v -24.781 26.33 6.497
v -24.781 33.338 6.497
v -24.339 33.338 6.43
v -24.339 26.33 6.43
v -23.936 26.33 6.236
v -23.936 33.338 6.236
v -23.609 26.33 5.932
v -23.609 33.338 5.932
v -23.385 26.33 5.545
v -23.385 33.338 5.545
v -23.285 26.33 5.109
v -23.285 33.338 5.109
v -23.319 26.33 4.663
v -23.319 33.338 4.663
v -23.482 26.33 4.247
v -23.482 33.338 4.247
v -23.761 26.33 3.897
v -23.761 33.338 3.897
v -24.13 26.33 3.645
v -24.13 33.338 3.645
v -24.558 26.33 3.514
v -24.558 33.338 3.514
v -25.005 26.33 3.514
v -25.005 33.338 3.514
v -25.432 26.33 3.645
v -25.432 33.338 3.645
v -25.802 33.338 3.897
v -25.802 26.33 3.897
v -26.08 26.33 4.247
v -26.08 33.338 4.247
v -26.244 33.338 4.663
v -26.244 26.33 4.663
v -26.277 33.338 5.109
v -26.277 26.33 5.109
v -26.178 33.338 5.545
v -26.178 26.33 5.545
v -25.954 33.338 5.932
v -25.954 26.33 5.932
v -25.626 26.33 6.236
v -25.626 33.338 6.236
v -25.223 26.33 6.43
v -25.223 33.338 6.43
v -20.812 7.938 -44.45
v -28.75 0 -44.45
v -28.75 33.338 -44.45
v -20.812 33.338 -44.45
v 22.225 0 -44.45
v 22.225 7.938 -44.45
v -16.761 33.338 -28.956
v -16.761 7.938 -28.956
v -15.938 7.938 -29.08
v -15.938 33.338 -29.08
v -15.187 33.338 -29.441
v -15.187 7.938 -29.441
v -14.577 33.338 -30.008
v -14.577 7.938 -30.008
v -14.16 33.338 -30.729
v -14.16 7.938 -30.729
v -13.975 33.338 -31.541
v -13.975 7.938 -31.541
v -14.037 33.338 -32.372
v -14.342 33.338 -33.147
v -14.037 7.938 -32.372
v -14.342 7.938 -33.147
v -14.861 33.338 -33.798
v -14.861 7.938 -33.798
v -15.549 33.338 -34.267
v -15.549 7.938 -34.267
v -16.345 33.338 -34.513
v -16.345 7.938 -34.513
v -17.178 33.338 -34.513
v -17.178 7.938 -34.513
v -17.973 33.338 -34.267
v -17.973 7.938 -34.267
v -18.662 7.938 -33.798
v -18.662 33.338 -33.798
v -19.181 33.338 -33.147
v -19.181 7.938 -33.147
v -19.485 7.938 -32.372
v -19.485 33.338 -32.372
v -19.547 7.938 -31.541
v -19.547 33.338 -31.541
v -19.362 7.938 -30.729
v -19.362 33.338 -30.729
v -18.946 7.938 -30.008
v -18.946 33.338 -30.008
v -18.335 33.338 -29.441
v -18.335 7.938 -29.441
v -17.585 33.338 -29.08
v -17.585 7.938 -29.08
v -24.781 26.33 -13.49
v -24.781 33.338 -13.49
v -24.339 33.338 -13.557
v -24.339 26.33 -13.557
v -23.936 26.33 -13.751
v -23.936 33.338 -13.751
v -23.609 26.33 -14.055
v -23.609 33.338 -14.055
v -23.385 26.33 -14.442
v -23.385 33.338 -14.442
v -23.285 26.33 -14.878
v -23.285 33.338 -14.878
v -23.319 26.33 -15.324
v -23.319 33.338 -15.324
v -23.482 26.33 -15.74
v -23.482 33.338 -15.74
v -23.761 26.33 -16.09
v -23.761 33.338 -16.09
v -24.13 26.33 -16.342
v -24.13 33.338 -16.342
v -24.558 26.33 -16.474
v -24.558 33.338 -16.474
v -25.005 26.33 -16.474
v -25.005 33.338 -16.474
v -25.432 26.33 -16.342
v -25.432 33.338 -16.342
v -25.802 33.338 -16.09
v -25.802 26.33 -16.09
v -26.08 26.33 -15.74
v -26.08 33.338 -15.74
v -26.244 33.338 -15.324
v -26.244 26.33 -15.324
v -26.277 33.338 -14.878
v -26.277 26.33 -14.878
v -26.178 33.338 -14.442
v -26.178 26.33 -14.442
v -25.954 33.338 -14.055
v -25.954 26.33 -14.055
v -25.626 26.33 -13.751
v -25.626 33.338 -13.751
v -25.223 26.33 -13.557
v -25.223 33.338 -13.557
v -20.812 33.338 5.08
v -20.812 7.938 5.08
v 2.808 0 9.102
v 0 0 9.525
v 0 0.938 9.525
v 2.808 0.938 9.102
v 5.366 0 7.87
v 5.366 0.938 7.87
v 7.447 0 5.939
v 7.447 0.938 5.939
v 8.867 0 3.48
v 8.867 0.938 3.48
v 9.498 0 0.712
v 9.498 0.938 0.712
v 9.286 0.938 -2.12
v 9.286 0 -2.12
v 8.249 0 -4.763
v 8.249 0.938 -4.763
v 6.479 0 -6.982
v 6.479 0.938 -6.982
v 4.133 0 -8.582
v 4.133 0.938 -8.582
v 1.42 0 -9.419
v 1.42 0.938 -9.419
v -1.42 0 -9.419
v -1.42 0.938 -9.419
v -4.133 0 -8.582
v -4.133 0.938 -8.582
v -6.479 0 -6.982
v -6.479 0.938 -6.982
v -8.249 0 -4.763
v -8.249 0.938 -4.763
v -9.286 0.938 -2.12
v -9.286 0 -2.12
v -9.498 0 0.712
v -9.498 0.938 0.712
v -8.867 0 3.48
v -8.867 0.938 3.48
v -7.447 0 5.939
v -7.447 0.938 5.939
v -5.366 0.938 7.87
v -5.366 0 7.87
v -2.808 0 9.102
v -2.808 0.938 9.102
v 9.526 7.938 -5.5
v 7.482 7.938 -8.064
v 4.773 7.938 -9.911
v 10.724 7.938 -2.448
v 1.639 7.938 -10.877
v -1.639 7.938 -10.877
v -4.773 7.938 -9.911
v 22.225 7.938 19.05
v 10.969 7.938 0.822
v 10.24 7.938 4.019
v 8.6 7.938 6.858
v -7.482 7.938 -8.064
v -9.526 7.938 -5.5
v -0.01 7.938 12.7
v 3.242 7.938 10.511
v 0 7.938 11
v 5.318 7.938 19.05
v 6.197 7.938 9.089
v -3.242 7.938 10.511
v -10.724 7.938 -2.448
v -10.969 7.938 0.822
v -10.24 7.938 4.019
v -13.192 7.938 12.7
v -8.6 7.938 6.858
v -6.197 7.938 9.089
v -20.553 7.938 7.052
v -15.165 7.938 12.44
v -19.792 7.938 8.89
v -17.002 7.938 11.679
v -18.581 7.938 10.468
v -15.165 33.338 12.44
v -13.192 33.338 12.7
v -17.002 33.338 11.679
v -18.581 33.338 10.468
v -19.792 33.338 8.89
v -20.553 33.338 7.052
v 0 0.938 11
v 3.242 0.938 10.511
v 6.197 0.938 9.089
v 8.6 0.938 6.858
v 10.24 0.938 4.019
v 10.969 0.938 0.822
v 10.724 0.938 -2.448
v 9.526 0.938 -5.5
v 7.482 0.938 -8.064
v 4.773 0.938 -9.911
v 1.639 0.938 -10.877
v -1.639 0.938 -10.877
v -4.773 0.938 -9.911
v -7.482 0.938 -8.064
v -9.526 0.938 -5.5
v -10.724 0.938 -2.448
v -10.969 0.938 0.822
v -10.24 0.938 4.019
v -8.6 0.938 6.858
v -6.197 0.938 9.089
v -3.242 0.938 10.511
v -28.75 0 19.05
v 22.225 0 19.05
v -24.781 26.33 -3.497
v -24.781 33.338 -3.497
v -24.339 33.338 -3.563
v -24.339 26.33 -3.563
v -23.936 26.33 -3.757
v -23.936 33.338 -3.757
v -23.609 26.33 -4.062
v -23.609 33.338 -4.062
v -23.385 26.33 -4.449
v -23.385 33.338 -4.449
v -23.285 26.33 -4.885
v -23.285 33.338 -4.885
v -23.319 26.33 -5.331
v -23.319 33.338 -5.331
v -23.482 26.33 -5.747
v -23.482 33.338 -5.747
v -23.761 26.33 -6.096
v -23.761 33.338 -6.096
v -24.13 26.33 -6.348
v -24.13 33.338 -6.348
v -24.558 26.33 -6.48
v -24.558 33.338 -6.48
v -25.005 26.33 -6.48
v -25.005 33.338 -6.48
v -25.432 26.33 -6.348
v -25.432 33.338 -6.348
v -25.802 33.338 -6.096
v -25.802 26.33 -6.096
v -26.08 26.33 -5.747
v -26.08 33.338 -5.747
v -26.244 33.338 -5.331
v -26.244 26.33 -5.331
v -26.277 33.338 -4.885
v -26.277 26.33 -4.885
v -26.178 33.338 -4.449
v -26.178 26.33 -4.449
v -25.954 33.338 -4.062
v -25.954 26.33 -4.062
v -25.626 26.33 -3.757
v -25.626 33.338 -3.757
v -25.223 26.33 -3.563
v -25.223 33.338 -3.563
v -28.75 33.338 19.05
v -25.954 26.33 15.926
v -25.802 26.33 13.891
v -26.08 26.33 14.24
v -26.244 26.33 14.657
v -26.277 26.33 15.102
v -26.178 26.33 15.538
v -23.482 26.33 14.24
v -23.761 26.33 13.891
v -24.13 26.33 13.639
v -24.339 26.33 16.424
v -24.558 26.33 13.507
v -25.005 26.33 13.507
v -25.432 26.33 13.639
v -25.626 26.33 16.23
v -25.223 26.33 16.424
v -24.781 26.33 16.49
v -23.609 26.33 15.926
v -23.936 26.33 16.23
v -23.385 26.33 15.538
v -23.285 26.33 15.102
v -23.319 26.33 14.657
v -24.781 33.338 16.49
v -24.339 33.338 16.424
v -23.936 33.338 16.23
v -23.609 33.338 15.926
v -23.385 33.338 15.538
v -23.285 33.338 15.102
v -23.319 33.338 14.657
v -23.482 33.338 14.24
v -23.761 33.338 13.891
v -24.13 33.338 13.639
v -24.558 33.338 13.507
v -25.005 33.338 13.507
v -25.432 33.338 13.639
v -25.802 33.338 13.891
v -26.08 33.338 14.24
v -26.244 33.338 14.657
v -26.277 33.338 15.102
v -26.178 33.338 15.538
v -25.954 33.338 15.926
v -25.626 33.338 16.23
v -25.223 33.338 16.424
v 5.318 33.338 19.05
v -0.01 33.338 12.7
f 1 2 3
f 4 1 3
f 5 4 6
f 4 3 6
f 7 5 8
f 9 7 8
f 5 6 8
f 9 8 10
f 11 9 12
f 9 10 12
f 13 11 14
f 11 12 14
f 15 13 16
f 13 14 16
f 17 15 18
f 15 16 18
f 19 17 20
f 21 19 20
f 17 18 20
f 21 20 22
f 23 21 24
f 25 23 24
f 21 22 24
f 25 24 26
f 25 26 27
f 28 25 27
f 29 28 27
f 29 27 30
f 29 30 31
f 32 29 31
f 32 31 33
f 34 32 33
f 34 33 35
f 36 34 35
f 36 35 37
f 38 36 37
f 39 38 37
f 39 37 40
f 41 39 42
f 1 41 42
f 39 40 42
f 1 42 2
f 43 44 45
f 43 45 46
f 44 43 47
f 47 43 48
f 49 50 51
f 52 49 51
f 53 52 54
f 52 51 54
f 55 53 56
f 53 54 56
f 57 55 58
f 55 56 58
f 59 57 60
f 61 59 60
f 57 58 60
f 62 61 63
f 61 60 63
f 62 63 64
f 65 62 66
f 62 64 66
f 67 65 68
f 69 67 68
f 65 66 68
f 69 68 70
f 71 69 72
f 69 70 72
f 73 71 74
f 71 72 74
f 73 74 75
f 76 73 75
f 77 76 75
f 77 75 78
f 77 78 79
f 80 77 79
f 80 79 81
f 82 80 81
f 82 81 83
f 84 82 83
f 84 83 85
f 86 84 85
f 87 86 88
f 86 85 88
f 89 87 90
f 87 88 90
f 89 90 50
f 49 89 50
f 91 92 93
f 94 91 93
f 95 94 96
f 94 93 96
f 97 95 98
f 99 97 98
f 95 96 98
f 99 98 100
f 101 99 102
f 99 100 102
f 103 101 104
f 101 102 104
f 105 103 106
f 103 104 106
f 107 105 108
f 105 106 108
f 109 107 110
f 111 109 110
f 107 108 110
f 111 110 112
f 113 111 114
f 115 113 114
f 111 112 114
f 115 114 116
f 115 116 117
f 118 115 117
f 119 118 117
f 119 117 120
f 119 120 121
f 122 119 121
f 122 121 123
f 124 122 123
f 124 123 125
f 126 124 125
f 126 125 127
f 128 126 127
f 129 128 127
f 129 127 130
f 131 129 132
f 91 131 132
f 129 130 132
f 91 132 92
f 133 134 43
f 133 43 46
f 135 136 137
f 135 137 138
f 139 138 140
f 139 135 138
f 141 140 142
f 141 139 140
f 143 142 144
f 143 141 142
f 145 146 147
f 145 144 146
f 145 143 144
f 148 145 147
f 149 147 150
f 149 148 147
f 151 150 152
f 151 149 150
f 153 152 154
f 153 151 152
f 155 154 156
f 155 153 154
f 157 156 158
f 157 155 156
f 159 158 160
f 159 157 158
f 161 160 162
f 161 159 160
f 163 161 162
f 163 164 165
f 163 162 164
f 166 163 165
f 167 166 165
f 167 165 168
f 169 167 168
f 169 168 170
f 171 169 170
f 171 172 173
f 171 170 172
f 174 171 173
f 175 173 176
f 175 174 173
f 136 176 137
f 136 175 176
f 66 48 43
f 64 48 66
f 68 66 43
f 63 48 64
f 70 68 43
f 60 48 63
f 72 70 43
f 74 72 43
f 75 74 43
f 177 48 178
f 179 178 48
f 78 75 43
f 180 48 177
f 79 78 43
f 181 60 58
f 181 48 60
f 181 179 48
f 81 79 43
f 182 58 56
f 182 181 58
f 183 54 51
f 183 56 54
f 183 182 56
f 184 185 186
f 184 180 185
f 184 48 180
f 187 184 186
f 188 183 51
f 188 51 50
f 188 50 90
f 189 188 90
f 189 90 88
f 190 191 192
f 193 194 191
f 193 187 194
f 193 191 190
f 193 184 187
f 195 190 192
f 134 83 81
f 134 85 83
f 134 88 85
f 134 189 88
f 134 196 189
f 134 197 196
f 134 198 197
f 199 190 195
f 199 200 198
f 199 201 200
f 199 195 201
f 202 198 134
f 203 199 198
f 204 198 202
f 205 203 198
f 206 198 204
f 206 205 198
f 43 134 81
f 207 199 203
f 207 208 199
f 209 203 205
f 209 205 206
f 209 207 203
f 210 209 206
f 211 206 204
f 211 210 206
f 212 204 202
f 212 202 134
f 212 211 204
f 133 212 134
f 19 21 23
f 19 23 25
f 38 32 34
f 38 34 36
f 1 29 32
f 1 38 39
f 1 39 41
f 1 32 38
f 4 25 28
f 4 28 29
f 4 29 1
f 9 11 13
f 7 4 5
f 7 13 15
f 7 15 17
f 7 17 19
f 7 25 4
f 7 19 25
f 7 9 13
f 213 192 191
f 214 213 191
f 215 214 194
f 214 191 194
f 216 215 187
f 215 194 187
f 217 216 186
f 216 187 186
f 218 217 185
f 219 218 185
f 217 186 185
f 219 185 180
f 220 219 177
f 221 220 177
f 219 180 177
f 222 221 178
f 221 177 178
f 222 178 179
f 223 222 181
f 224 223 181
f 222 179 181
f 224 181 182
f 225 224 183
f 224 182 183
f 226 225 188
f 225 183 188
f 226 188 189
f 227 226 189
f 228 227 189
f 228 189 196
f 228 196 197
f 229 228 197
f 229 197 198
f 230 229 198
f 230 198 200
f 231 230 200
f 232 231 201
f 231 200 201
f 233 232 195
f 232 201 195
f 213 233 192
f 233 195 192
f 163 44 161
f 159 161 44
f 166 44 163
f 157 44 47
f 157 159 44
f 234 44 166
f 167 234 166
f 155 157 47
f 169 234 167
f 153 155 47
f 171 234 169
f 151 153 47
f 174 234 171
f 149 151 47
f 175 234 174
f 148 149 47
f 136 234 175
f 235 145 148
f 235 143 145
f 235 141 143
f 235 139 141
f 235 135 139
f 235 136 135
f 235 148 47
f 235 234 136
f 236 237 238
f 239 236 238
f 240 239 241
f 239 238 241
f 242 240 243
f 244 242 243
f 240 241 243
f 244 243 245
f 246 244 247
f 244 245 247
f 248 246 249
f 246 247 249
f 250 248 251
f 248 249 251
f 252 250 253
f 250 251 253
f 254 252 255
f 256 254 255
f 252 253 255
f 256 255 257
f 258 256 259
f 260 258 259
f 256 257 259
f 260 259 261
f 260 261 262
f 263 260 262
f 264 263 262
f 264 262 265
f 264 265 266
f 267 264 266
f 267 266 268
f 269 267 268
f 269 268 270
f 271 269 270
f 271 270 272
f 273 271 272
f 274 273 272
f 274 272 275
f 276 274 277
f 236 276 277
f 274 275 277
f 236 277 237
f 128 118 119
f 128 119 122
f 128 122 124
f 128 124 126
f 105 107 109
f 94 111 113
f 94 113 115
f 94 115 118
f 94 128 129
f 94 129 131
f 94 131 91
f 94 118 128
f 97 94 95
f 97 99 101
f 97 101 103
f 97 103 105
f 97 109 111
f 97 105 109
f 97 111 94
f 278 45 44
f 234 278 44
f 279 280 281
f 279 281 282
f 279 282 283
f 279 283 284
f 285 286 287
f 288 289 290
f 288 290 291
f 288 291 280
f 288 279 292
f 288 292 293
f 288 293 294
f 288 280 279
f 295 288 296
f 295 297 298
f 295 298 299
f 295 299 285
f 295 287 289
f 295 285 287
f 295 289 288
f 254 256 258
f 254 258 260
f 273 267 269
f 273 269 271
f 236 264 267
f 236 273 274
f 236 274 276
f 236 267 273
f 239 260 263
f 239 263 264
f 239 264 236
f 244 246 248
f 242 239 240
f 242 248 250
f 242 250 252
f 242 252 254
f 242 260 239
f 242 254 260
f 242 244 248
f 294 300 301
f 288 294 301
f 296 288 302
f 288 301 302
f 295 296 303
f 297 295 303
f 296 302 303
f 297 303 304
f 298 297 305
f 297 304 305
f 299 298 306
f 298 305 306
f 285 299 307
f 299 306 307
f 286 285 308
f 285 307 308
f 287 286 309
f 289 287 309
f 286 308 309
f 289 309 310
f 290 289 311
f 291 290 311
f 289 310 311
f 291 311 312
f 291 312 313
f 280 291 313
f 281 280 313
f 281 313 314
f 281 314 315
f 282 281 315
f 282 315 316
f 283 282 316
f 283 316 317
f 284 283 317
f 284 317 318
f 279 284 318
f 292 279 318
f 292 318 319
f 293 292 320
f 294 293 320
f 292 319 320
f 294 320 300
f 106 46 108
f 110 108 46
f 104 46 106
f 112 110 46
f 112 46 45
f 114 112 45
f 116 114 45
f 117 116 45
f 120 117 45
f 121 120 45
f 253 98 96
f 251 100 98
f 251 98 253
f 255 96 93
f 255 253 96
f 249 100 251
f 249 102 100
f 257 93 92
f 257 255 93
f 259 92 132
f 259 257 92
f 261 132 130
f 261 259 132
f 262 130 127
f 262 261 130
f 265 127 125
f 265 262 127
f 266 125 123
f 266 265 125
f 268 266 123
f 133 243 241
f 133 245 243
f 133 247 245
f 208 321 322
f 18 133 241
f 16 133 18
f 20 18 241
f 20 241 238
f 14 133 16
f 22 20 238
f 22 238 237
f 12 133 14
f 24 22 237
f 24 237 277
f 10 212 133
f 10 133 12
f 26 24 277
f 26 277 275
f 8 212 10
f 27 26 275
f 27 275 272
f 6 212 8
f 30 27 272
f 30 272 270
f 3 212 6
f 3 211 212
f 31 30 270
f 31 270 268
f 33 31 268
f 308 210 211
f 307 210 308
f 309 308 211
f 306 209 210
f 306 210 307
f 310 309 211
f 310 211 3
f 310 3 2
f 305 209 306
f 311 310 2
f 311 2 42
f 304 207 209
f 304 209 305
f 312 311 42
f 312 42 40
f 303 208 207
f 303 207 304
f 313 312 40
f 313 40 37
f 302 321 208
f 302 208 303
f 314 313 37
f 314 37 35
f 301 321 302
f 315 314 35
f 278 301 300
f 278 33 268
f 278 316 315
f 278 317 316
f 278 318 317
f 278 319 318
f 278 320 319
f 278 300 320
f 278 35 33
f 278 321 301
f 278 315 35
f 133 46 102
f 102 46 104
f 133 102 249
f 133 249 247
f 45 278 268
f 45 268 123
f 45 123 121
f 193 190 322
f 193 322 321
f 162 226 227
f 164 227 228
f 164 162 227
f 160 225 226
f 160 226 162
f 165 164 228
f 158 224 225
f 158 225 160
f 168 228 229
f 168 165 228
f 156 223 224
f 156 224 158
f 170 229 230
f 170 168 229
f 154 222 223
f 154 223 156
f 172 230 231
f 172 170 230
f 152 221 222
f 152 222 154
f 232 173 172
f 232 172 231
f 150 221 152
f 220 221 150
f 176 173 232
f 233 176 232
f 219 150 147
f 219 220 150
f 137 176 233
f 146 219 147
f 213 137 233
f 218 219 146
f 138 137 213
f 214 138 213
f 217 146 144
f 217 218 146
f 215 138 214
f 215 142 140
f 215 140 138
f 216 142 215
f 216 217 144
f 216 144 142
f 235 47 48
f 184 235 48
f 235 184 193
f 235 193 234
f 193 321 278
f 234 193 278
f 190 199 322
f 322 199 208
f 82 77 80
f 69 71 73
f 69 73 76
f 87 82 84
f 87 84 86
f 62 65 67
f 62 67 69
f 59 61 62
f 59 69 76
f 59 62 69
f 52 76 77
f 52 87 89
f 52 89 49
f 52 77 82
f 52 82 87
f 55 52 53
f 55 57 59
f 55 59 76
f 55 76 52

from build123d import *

# Parameters (mm, degrees)
SKETCH1_W            = 50.975
SKETCH1_H            = 38.1
BASE_DEPTH           = 7.9375
SKETCH2_R            = 11
BEARING_BORE_DEPTH   = 7
THRU_HOLE_DEPTH      = 36.191831439
THRU_HOLE_DEPTH_BACK = 36.191831439
SKETCH3_R            = 9.525
SKETCH4_W            = 7.9375
SKETCH4_H            = 38.1
VERTICAL_DEPTH       = 25.4
SKETCH7_W            = 6.35
SKETCH7_H            = 25.4
ARM_STOP_DEPTH       = 20.8026
ANGLED_FACE_REACH    = 49.967
FILLET1_R            = 7.62
SKETCH6_R            = 1.5
DOWEL_HOLES_DEPTH    = 7.007999954
SPRING_BASE_DEPTH    = 25.4
SKETCH12_R           = 2.794
SPRING_MOUNT_DEPTH   = 25.4


with BuildPart() as part:
    # Sketch1 → Base (new body)
    with BuildSketch(Plane(origin=(0, 0, 0), x_dir=(1, 0, 0), z_dir=(0, 1, 0))):
        with Locations((-3.2625, 0)):
            Rectangle(SKETCH1_W, SKETCH1_H)
    extrude(amount=BASE_DEPTH)

    # Sketch2 → Bearing Bore (cut)
    with BuildSketch(Plane(origin=(0, 7.9375, 0), x_dir=(1, 0, 0), z_dir=(0, 1, 0))):
        with Locations(Location((0, 0, 0), (0, 0, 270))):
            Circle(SKETCH2_R)
    extrude(amount=-BEARING_BORE_DEPTH, mode=Mode.SUBTRACT)

    # Sketch3 → Thru Hole (cut, two sides: drawn at the far end of the back side and taken through both)
    with BuildSketch(Plane(origin=(0, 0.9375, 0), x_dir=(1, 0, 0), z_dir=(0, 1, 0)).offset(-THRU_HOLE_DEPTH_BACK)):
        with Locations(Location((0, 0, 0), (0, 0, 270))):
            Circle(SKETCH3_R)
    extrude(amount=THRU_HOLE_DEPTH + THRU_HOLE_DEPTH_BACK, mode=Mode.SUBTRACT)

    # Sketch4 → Vertical (add)
    with BuildSketch(Plane(origin=(0, 7.9375, 0), x_dir=(1, 0, 0), z_dir=(0, 1, 0))):
        with Locations((-24.78125, 0)):
            Rectangle(SKETCH4_W, SKETCH4_H)
    extrude(amount=VERTICAL_DEPTH)

    # Sketch7 → Arm Stop (add)
    with BuildSketch(Plane(origin=(-20.8125, 0, 0), x_dir=(0, 0, -1), z_dir=(1, 0, 0))):
        with Locations((-15.875, 20.6375)):
            Rectangle(SKETCH7_W, SKETCH7_H)
    extrude(amount=ARM_STOP_DEPTH)

    # Sketch8 → Angled Face (add, up to next)
    with BuildSketch(Plane(origin=(0, 33.3375, 0), x_dir=(1, 0, 0), z_dir=(0, 1, 0)), mode=Mode.PRIVATE) as angled_face_sk1:
        Polygon((-0.0099, -12.7), (5.318382658, -19.05), (-0.0099, -19.05), align=None)
    angled_face_tool1 = extrude(angled_face_sk1.sketch, amount=-ANGLED_FACE_REACH, mode=Mode.PRIVATE) - part.part
    add(angled_face_tool1.solids().sort_by_distance((1.766194, 33.3375, 16.933333))[0])

    # Fillet1
    fillet1_edges = [part.edges().sort_by_distance(p)[0] for p in [
        (-20.8125, 20.6375, 12.7),
    ]]
    fillet(fillet1_edges, radius=FILLET1_R)

    # Sketch6 → Dowel Holes (cut)
    with BuildSketch(Plane(origin=(0, 33.3375, 0), x_dir=(1, 0, 0), z_dir=(0, 1, 0))):
        with Locations(Location((-24.78125, 14.990388599, 0), (0, 0, 270))):
            Circle(SKETCH6_R)
        with Locations(Location((-24.78125, 4.9967962, 0), (0, 0, 270))):
            Circle(SKETCH6_R)
        with Locations(Location((-24.78125, -14.990388599, 0), (0, 0, 270))):
            Circle(SKETCH6_R)
        with Locations(Location((-24.78125, -4.9967962, 0), (0, 0, 270))):
            Circle(SKETCH6_R)
    extrude(amount=-DOWEL_HOLES_DEPTH, mode=Mode.SUBTRACT)

    # Sketch11 → Spring Base (add)
    with BuildSketch(Plane(origin=(0, 0, -19.05), x_dir=(-1, 0, 0), z_dir=(0, 0, -1))):
        Polygon((-22.225, 7.9375), (20.8125, 7.9375), (20.8125, 33.3375), (28.75, 33.3375), (28.75, 0), (-22.225, 0), align=None)
    extrude(amount=SPRING_BASE_DEPTH)

    # Sketch12 → Spring Mount (add)
    with BuildSketch(Plane(origin=(0, 7.9375, 0), x_dir=(1, 0, 0), z_dir=(0, 1, 0))):
        with Locations(Location((-16.7612, 31.75, 0), (0, 0, 270))):
            Circle(SKETCH12_R)
    extrude(amount=SPRING_MOUNT_DEPTH)


solid = part.part
